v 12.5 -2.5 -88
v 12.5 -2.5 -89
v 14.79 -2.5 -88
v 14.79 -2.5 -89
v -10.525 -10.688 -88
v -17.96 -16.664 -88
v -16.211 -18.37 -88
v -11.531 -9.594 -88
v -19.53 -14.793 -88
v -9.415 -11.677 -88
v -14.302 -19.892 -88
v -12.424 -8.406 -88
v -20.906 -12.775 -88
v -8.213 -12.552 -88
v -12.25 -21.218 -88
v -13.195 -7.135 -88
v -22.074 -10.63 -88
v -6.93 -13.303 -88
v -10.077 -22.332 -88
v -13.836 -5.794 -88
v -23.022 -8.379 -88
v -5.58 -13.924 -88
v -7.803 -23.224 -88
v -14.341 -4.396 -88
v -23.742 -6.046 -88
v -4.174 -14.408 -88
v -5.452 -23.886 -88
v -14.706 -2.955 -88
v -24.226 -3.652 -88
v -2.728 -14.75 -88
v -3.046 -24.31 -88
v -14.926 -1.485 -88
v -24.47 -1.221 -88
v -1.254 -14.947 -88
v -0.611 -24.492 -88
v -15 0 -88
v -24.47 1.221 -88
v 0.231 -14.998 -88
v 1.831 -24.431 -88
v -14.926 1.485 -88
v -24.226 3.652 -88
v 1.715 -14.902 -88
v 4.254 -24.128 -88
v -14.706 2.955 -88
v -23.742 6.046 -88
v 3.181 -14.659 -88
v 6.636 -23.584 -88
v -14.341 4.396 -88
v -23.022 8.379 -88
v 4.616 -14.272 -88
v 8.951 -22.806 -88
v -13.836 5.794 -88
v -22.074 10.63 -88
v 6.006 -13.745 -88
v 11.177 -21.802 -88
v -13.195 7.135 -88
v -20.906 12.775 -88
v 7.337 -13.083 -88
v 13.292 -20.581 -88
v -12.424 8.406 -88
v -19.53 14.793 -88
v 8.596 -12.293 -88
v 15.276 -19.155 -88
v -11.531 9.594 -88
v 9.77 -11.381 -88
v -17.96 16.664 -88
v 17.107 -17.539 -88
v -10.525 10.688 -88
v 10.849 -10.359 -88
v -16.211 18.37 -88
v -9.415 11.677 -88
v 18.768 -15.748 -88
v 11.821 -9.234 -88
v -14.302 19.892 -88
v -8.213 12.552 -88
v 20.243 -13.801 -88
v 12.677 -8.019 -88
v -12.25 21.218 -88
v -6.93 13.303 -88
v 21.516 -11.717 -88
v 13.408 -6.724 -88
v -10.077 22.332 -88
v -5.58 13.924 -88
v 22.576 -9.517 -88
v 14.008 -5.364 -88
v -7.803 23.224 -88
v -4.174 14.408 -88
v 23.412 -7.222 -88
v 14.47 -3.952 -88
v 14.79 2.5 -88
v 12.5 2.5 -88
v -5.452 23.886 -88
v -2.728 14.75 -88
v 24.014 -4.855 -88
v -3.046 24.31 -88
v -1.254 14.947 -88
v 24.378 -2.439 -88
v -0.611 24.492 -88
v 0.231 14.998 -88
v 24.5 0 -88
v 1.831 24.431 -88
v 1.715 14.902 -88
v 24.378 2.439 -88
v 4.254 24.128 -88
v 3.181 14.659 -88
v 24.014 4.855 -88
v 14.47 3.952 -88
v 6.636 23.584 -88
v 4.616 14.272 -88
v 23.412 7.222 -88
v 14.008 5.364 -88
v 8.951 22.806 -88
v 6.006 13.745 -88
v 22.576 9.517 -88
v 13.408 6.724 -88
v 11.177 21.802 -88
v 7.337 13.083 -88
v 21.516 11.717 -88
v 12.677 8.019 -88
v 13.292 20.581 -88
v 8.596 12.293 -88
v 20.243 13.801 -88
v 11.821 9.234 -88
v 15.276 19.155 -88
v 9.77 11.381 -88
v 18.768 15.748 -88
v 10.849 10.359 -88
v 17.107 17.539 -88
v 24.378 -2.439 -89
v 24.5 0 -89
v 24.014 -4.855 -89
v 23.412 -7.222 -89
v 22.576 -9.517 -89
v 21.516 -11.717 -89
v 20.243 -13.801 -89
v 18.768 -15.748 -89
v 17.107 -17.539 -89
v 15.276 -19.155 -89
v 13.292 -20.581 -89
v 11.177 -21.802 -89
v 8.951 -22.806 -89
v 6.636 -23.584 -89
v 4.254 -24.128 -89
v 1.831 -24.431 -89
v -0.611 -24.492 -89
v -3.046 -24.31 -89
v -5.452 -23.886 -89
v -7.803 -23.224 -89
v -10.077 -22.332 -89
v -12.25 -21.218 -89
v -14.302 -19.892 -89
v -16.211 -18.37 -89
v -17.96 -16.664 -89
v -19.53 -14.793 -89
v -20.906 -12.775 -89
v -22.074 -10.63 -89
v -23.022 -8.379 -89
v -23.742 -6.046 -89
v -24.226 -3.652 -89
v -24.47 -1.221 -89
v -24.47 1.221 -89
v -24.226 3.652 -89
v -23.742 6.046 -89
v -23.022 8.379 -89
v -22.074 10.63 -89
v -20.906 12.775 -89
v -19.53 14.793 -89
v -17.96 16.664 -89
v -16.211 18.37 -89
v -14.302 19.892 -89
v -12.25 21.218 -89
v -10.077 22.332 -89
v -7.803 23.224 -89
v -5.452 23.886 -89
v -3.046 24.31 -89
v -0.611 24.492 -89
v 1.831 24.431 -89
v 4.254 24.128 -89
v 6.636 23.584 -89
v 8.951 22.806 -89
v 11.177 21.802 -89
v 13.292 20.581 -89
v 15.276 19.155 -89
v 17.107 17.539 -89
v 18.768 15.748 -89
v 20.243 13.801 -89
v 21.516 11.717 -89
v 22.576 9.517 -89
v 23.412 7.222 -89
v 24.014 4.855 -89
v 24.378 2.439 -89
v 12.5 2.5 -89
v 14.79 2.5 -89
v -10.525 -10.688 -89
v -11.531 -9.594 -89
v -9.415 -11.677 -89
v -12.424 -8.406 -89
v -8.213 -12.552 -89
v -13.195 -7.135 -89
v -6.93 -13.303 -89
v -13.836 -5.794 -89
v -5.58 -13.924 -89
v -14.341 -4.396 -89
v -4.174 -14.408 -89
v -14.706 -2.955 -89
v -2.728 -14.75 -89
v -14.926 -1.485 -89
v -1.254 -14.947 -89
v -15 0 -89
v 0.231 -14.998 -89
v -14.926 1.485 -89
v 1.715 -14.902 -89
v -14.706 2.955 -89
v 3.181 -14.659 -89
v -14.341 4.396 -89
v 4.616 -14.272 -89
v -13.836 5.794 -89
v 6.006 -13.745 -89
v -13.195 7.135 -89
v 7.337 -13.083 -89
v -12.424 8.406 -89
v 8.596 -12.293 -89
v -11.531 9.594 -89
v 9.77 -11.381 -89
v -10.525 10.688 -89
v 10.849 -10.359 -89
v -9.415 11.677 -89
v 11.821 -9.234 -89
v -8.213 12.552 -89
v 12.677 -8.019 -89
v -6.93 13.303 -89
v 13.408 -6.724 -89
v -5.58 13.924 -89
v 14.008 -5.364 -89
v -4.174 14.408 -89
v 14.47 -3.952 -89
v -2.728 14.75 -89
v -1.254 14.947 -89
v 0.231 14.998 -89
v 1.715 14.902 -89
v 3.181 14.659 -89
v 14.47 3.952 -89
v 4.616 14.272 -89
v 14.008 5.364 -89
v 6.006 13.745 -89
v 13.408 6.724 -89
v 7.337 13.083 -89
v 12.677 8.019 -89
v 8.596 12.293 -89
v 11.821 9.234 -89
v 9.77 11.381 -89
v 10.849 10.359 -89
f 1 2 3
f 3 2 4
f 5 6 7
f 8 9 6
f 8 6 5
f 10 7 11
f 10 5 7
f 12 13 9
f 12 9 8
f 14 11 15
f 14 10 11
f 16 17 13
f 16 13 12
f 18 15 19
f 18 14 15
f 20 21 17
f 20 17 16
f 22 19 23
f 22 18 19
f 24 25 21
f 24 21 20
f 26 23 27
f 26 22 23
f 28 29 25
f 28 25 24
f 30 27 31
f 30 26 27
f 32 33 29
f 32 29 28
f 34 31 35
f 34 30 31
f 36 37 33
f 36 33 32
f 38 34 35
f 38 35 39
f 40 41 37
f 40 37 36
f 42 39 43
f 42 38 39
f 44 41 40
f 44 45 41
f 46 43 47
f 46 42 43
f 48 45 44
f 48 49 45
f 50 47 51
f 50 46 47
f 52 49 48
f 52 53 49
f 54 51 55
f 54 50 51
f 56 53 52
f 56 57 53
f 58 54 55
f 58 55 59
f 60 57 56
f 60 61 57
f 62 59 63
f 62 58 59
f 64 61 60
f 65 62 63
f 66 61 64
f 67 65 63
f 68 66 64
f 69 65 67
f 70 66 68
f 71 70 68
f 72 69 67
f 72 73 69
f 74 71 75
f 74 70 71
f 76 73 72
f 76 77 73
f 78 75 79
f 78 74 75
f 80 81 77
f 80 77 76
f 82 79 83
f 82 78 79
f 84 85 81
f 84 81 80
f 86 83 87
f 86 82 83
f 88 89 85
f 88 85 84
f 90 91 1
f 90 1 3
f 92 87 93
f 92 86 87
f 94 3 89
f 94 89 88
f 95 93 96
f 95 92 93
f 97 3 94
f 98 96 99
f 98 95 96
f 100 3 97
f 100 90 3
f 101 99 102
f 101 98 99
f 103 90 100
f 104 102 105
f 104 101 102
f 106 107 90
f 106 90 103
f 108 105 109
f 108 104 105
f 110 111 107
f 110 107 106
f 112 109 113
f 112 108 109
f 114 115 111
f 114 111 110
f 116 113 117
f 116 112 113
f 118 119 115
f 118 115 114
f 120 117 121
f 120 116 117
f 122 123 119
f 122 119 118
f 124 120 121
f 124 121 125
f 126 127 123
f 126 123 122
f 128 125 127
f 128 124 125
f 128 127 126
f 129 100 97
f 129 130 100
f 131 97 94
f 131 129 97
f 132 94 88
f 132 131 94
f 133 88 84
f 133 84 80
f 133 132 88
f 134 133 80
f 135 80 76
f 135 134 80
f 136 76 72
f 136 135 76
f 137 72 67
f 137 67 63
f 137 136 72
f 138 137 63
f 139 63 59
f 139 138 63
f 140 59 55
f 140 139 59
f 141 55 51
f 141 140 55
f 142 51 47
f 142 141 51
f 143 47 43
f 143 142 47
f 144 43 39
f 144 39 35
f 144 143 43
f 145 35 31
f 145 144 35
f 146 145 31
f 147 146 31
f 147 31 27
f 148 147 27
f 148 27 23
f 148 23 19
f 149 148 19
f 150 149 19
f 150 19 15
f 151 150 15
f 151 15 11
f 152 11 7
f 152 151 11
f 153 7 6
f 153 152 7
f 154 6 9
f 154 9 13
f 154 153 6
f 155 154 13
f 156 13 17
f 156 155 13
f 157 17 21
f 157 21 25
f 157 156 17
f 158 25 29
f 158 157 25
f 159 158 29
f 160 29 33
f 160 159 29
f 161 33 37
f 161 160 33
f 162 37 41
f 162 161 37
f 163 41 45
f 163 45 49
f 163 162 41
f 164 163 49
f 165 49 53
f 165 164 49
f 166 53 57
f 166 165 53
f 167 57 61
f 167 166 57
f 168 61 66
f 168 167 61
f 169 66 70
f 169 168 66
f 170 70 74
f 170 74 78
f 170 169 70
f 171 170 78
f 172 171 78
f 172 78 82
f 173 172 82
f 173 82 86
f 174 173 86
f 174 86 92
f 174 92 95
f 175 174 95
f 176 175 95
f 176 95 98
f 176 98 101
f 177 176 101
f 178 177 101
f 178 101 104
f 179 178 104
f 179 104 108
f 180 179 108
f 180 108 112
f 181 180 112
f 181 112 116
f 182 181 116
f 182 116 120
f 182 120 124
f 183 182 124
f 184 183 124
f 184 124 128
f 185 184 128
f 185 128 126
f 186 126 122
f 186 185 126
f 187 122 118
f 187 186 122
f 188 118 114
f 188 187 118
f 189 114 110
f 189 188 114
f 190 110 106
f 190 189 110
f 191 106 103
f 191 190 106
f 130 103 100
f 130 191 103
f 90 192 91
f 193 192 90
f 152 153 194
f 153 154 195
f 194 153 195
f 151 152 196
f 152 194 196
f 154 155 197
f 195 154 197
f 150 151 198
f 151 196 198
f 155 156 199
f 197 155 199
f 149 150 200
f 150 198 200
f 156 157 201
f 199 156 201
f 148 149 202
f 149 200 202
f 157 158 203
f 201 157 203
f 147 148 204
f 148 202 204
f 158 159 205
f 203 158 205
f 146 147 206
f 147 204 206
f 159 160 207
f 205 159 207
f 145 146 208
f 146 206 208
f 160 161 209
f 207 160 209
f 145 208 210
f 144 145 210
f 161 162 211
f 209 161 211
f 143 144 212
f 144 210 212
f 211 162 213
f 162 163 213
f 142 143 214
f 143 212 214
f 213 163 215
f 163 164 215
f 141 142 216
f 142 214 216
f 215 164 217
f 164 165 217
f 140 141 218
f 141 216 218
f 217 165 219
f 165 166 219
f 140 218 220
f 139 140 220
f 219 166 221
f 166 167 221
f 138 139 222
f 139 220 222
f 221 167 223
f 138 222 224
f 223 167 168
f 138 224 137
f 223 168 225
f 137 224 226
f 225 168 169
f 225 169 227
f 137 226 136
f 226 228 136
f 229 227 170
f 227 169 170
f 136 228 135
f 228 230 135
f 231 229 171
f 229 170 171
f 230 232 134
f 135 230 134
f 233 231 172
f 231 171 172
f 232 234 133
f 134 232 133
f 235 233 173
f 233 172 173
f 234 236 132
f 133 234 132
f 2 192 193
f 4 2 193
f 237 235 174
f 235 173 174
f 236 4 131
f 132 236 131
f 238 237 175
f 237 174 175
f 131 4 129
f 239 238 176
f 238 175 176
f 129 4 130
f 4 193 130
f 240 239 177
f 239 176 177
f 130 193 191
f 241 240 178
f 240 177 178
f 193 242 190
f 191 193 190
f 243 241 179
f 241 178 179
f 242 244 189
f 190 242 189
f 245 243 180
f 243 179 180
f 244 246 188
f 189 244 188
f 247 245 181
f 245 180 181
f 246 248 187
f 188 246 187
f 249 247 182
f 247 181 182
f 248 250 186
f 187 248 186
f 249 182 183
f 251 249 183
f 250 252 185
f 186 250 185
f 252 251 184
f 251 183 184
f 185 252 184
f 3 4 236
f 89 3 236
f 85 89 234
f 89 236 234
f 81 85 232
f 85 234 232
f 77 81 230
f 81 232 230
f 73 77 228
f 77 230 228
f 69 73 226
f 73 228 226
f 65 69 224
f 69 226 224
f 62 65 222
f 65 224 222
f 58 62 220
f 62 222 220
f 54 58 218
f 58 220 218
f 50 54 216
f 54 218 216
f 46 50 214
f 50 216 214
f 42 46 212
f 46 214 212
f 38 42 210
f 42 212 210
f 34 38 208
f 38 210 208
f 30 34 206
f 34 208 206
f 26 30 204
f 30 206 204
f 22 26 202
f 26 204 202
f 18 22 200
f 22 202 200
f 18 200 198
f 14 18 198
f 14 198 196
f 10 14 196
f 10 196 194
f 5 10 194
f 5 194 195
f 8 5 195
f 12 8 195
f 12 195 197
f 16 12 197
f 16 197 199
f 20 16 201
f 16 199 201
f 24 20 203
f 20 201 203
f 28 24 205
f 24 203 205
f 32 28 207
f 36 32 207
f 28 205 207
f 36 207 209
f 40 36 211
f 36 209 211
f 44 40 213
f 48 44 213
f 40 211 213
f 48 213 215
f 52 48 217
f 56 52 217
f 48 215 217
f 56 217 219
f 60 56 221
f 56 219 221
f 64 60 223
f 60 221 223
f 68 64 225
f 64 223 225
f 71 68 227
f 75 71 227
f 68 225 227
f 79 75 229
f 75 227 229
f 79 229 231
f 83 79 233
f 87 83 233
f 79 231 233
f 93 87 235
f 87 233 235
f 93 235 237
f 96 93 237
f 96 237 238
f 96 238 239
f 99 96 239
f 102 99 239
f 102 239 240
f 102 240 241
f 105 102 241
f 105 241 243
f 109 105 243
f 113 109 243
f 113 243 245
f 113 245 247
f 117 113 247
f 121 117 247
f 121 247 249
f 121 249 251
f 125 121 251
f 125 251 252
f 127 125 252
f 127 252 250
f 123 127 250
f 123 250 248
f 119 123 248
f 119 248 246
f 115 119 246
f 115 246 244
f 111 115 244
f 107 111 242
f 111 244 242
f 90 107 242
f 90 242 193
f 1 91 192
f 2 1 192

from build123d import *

# Parameters (mm, degrees)
SKETCH1_W                    = 9.5
SKETCH1_H                    = 1
SKETCH2_W                    = 2.7
SKETCH2_H                    = 1
EX_INNER_TAB_5MM_M27_5_DEPTH = 2.5


with BuildPart() as part:
    # Sketch1 → REV_MB6_30x49x1 (revolve)
    with BuildSketch(Plane(origin=(0, 0, 0), x_dir=(1, 0, 0), z_dir=(0, 1, 0))):
        with Locations((19.75, 88.5)):
            Rectangle(SKETCH1_W, SKETCH1_H)
    revolve(axis=Axis((0, 0, 150), (0, 0, -1)))

    # Sketch2 → EX_Inner_Tab_5mm_M27.5 (add, symmetric)
    with BuildSketch(Plane(origin=(0, 0, 0), x_dir=(1, 0, 0), z_dir=(0, 1, 0))):
        with Locations((13.85, 88.5)):
            Rectangle(SKETCH2_W, SKETCH2_H)
    extrude(amount=EX_INNER_TAB_5MM_M27_5_DEPTH, both=True)


solid = part.part
